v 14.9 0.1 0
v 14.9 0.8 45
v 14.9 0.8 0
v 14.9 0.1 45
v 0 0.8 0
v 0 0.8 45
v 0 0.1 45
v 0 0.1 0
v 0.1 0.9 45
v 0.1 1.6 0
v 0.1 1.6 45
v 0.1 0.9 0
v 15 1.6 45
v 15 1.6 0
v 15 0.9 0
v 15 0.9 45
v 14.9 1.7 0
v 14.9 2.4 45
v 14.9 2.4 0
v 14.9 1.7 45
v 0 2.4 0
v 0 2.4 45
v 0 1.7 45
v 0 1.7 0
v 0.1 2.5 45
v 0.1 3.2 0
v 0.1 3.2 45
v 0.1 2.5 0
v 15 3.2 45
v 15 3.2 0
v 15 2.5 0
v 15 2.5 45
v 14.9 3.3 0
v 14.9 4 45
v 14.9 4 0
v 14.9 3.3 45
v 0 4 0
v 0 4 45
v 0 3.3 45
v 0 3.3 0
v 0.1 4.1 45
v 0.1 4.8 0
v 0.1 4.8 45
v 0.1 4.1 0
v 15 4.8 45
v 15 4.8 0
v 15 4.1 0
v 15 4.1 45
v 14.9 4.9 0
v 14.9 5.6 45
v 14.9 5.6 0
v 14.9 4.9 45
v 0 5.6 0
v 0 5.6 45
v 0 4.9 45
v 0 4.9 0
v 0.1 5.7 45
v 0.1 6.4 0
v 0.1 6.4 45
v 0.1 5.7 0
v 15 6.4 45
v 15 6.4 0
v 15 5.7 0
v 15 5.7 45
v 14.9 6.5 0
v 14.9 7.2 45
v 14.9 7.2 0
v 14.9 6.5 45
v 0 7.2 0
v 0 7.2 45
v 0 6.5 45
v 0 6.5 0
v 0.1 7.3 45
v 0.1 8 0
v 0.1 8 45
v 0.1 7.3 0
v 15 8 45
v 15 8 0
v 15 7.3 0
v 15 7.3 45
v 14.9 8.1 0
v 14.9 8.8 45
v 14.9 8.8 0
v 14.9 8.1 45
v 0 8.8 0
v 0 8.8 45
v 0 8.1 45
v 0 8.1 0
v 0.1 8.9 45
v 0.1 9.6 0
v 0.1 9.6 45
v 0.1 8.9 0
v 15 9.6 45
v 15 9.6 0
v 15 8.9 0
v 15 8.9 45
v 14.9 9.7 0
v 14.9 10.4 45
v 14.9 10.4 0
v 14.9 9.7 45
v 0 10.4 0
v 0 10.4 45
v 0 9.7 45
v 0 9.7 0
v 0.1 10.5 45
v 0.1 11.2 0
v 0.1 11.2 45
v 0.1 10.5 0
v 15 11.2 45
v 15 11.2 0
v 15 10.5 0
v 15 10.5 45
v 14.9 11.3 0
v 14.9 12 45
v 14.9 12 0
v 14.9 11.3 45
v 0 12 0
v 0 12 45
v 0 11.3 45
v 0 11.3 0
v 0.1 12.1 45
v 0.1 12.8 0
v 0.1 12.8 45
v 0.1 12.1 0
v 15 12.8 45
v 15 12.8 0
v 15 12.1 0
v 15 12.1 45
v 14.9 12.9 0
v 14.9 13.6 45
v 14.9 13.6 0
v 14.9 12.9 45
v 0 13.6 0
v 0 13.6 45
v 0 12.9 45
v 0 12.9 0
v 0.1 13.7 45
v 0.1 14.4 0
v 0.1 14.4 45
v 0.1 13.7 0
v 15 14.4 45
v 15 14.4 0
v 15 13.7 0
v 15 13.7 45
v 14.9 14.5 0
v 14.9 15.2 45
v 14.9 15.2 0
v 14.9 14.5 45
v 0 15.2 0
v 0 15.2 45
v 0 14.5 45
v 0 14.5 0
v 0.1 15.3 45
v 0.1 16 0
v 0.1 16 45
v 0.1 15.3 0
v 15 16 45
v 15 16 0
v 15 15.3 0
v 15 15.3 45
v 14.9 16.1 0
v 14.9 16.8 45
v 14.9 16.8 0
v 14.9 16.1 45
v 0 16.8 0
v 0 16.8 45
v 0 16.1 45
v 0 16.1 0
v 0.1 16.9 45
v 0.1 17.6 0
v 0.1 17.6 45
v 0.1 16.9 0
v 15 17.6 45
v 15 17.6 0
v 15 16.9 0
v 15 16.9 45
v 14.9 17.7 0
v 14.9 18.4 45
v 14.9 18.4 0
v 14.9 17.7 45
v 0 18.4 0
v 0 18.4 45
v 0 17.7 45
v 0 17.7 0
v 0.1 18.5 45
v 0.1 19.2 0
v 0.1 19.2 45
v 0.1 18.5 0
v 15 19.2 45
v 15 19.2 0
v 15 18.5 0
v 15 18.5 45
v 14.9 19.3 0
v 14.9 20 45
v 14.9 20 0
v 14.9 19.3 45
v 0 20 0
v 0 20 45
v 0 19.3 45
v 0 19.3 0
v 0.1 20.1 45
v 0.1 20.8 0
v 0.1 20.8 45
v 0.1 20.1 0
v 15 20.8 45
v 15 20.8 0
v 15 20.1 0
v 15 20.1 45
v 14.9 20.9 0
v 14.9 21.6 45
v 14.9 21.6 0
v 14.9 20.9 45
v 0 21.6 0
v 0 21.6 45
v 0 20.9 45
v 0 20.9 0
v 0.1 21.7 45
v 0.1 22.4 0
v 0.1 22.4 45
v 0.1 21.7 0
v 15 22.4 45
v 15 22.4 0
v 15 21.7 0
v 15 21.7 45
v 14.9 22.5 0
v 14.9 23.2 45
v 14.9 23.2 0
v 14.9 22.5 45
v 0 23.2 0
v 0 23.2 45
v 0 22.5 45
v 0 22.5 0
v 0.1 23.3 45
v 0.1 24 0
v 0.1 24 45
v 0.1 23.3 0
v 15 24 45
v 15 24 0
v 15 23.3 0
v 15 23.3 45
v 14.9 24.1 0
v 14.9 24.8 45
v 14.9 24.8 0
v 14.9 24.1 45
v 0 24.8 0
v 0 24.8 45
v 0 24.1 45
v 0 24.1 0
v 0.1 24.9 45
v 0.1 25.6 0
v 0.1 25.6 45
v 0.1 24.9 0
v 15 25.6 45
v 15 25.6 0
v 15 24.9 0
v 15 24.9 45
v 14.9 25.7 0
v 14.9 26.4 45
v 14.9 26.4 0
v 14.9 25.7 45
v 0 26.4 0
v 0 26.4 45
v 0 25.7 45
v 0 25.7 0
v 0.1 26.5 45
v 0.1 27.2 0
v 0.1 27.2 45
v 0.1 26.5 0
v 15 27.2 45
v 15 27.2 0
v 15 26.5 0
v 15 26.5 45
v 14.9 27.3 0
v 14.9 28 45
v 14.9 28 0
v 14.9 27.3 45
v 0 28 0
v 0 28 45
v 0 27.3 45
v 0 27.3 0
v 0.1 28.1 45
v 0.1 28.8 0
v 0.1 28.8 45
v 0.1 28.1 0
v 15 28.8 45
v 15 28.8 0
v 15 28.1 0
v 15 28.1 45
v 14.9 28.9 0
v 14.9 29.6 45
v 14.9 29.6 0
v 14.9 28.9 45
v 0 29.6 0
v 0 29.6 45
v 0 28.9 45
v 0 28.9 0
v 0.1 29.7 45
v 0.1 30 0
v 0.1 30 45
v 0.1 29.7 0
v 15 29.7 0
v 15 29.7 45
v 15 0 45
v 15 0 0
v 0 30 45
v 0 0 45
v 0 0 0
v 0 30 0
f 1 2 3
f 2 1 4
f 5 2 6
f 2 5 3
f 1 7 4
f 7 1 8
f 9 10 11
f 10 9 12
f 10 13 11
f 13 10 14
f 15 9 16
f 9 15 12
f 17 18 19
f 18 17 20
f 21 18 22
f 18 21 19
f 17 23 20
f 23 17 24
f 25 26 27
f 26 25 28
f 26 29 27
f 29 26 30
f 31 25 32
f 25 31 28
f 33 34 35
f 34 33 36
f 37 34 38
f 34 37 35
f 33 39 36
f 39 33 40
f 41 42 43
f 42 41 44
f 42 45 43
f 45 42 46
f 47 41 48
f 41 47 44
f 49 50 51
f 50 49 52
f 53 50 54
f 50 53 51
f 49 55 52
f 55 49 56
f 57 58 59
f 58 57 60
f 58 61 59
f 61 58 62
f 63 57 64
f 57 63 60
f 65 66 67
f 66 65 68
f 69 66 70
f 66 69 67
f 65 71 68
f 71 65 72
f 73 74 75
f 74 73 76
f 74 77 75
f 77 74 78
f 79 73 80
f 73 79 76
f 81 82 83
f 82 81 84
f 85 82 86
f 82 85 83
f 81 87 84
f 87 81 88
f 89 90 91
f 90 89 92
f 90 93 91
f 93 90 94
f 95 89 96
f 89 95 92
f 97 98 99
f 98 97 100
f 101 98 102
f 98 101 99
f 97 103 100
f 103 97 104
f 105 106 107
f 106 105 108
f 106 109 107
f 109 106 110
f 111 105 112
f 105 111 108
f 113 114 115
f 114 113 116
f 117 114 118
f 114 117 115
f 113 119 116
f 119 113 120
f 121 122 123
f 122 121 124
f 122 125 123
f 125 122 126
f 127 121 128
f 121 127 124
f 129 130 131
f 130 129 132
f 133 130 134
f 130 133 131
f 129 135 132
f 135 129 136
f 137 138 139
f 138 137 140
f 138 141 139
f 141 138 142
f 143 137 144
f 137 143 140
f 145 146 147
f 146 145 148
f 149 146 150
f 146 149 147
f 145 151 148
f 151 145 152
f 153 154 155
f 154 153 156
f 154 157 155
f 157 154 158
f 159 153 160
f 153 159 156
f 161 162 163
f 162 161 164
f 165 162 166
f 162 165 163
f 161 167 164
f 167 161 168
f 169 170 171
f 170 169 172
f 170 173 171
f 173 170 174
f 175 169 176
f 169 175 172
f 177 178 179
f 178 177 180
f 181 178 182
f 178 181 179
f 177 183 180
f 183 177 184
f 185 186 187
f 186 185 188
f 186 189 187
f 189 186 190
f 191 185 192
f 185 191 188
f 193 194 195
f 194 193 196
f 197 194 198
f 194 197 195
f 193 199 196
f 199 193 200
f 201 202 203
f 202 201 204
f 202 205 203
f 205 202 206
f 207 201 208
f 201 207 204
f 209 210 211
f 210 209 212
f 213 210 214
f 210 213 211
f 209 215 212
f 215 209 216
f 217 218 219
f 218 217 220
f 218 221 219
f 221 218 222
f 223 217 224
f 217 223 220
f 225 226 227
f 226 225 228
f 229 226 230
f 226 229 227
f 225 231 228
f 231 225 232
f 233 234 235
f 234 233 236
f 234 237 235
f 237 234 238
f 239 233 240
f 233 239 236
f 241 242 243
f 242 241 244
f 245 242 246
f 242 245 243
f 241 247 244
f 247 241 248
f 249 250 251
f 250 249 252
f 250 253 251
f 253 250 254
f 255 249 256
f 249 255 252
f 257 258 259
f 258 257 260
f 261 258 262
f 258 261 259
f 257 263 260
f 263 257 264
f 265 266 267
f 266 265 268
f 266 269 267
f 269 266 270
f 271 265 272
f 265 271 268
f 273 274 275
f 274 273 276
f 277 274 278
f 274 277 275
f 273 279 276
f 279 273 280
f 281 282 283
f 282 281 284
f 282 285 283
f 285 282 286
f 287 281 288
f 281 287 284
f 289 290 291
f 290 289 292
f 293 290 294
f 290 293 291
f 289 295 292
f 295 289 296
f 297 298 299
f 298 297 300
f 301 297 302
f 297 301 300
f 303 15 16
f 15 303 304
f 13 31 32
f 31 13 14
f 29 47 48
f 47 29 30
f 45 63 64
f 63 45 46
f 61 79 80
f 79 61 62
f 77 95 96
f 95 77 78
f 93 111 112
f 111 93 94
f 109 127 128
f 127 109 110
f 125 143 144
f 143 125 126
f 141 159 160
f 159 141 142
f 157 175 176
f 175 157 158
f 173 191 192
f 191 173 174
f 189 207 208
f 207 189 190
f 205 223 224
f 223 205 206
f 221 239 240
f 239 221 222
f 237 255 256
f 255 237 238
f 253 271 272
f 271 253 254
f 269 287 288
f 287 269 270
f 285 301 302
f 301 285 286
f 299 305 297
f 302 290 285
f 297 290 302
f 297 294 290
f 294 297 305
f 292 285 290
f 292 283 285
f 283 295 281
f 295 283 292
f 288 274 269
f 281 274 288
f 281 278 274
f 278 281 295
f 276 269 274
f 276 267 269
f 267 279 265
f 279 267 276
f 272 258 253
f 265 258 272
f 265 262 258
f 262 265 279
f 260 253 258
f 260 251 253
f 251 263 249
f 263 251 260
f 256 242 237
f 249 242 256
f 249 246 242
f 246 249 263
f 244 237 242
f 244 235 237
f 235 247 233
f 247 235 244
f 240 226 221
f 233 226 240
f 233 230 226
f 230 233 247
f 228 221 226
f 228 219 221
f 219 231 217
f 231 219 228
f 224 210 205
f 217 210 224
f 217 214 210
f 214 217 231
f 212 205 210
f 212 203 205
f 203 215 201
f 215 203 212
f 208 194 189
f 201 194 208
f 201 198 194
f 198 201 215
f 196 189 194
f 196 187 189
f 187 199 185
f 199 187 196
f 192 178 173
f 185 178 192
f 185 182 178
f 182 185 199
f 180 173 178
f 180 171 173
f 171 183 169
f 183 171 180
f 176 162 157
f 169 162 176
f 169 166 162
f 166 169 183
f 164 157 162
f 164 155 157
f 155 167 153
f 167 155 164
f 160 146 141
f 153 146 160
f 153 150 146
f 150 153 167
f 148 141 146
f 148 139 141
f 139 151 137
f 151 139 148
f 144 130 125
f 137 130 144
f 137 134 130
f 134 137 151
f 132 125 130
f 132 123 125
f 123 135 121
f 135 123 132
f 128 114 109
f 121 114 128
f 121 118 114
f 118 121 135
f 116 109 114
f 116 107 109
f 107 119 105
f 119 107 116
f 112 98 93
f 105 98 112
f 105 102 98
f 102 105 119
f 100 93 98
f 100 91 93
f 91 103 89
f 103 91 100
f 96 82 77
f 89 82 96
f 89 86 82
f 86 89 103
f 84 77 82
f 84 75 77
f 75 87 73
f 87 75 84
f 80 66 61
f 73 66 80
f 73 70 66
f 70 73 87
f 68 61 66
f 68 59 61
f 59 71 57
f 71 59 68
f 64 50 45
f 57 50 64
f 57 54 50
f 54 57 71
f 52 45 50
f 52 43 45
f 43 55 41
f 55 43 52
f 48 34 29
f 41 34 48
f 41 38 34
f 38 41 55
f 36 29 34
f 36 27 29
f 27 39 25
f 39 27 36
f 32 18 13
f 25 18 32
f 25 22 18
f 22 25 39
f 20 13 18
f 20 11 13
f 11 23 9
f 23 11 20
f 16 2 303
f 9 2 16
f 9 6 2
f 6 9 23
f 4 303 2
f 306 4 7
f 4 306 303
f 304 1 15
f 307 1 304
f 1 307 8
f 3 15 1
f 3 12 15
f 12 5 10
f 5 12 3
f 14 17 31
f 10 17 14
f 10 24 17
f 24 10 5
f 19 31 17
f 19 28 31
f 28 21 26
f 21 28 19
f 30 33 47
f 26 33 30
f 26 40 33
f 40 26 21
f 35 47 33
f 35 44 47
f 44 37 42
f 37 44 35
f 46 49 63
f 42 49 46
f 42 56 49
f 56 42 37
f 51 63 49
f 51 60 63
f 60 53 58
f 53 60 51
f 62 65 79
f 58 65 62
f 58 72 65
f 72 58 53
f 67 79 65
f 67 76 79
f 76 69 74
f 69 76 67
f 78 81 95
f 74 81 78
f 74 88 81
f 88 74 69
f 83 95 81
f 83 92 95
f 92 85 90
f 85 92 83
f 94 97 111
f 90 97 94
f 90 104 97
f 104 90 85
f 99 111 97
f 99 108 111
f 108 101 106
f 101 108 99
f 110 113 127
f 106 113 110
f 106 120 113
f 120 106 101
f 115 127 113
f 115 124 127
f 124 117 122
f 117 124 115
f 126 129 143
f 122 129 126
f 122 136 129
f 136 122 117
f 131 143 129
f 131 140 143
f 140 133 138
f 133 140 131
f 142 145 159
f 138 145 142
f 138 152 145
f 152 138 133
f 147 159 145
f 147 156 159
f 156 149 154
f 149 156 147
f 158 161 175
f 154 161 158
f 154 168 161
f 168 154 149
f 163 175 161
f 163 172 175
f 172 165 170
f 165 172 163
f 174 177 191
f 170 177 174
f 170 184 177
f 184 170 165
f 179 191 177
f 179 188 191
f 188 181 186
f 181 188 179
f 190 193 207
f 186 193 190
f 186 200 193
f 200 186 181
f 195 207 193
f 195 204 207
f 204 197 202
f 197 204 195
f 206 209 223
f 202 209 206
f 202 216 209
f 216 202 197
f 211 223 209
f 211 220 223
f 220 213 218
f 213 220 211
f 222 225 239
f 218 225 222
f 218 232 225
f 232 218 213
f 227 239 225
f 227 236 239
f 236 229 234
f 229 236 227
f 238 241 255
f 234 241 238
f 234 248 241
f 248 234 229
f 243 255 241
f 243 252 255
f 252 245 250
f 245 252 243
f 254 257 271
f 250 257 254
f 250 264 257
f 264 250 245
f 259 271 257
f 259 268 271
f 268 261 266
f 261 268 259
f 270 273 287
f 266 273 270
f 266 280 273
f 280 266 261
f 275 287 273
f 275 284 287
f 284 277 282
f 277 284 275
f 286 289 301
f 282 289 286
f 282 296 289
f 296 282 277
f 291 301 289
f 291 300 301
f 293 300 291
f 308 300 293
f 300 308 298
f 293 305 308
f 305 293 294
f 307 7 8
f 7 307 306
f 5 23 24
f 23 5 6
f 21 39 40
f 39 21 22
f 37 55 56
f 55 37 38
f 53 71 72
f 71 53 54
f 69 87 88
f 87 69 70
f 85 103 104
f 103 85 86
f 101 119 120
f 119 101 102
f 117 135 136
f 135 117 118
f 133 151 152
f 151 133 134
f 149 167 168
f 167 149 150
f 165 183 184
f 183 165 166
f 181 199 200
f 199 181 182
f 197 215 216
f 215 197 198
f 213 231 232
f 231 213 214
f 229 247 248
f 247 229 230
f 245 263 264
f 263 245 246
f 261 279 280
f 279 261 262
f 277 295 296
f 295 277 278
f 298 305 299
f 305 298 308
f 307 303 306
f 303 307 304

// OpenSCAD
//Nathanael Lane

module scaffold(xyz = [10, 10, 10], w = 0.2, g = 1, y_accordion = false, mirror = false, center = false){

	lim = y_accordion ? xyz[1] : xyz[0];
	mir = mirror ? -1 : 1;
	
	translate(center ? xyz / -2 : [0, 0, 0])
		difference(){
	
			cube(xyz);
		
			for(o = [0 : (g + w) * 2 : lim]){
		
				if(y_accordion){
		
					translate([w * mir, w + o, -1])
						cube([xyz[0], g, xyz[2] + 2]);
						
					translate([-w * mir, w * 2 + g + o, -1])
						cube([xyz[0], g, xyz[2] + 2]);
				}else{
				
					translate([w + o, w * mir, -1])
						cube([g, xyz[1], xyz[2] + 2]);
		
					translate([w * 2 + g + o, -w * mir, -1])
						cube([g, xyz[1], xyz[2] + 2]);		
				}
			}
		}
}

scaffold([15, 30, 45], g = 0.7, w = 0.1, y_accordion = true, mirror = true);
